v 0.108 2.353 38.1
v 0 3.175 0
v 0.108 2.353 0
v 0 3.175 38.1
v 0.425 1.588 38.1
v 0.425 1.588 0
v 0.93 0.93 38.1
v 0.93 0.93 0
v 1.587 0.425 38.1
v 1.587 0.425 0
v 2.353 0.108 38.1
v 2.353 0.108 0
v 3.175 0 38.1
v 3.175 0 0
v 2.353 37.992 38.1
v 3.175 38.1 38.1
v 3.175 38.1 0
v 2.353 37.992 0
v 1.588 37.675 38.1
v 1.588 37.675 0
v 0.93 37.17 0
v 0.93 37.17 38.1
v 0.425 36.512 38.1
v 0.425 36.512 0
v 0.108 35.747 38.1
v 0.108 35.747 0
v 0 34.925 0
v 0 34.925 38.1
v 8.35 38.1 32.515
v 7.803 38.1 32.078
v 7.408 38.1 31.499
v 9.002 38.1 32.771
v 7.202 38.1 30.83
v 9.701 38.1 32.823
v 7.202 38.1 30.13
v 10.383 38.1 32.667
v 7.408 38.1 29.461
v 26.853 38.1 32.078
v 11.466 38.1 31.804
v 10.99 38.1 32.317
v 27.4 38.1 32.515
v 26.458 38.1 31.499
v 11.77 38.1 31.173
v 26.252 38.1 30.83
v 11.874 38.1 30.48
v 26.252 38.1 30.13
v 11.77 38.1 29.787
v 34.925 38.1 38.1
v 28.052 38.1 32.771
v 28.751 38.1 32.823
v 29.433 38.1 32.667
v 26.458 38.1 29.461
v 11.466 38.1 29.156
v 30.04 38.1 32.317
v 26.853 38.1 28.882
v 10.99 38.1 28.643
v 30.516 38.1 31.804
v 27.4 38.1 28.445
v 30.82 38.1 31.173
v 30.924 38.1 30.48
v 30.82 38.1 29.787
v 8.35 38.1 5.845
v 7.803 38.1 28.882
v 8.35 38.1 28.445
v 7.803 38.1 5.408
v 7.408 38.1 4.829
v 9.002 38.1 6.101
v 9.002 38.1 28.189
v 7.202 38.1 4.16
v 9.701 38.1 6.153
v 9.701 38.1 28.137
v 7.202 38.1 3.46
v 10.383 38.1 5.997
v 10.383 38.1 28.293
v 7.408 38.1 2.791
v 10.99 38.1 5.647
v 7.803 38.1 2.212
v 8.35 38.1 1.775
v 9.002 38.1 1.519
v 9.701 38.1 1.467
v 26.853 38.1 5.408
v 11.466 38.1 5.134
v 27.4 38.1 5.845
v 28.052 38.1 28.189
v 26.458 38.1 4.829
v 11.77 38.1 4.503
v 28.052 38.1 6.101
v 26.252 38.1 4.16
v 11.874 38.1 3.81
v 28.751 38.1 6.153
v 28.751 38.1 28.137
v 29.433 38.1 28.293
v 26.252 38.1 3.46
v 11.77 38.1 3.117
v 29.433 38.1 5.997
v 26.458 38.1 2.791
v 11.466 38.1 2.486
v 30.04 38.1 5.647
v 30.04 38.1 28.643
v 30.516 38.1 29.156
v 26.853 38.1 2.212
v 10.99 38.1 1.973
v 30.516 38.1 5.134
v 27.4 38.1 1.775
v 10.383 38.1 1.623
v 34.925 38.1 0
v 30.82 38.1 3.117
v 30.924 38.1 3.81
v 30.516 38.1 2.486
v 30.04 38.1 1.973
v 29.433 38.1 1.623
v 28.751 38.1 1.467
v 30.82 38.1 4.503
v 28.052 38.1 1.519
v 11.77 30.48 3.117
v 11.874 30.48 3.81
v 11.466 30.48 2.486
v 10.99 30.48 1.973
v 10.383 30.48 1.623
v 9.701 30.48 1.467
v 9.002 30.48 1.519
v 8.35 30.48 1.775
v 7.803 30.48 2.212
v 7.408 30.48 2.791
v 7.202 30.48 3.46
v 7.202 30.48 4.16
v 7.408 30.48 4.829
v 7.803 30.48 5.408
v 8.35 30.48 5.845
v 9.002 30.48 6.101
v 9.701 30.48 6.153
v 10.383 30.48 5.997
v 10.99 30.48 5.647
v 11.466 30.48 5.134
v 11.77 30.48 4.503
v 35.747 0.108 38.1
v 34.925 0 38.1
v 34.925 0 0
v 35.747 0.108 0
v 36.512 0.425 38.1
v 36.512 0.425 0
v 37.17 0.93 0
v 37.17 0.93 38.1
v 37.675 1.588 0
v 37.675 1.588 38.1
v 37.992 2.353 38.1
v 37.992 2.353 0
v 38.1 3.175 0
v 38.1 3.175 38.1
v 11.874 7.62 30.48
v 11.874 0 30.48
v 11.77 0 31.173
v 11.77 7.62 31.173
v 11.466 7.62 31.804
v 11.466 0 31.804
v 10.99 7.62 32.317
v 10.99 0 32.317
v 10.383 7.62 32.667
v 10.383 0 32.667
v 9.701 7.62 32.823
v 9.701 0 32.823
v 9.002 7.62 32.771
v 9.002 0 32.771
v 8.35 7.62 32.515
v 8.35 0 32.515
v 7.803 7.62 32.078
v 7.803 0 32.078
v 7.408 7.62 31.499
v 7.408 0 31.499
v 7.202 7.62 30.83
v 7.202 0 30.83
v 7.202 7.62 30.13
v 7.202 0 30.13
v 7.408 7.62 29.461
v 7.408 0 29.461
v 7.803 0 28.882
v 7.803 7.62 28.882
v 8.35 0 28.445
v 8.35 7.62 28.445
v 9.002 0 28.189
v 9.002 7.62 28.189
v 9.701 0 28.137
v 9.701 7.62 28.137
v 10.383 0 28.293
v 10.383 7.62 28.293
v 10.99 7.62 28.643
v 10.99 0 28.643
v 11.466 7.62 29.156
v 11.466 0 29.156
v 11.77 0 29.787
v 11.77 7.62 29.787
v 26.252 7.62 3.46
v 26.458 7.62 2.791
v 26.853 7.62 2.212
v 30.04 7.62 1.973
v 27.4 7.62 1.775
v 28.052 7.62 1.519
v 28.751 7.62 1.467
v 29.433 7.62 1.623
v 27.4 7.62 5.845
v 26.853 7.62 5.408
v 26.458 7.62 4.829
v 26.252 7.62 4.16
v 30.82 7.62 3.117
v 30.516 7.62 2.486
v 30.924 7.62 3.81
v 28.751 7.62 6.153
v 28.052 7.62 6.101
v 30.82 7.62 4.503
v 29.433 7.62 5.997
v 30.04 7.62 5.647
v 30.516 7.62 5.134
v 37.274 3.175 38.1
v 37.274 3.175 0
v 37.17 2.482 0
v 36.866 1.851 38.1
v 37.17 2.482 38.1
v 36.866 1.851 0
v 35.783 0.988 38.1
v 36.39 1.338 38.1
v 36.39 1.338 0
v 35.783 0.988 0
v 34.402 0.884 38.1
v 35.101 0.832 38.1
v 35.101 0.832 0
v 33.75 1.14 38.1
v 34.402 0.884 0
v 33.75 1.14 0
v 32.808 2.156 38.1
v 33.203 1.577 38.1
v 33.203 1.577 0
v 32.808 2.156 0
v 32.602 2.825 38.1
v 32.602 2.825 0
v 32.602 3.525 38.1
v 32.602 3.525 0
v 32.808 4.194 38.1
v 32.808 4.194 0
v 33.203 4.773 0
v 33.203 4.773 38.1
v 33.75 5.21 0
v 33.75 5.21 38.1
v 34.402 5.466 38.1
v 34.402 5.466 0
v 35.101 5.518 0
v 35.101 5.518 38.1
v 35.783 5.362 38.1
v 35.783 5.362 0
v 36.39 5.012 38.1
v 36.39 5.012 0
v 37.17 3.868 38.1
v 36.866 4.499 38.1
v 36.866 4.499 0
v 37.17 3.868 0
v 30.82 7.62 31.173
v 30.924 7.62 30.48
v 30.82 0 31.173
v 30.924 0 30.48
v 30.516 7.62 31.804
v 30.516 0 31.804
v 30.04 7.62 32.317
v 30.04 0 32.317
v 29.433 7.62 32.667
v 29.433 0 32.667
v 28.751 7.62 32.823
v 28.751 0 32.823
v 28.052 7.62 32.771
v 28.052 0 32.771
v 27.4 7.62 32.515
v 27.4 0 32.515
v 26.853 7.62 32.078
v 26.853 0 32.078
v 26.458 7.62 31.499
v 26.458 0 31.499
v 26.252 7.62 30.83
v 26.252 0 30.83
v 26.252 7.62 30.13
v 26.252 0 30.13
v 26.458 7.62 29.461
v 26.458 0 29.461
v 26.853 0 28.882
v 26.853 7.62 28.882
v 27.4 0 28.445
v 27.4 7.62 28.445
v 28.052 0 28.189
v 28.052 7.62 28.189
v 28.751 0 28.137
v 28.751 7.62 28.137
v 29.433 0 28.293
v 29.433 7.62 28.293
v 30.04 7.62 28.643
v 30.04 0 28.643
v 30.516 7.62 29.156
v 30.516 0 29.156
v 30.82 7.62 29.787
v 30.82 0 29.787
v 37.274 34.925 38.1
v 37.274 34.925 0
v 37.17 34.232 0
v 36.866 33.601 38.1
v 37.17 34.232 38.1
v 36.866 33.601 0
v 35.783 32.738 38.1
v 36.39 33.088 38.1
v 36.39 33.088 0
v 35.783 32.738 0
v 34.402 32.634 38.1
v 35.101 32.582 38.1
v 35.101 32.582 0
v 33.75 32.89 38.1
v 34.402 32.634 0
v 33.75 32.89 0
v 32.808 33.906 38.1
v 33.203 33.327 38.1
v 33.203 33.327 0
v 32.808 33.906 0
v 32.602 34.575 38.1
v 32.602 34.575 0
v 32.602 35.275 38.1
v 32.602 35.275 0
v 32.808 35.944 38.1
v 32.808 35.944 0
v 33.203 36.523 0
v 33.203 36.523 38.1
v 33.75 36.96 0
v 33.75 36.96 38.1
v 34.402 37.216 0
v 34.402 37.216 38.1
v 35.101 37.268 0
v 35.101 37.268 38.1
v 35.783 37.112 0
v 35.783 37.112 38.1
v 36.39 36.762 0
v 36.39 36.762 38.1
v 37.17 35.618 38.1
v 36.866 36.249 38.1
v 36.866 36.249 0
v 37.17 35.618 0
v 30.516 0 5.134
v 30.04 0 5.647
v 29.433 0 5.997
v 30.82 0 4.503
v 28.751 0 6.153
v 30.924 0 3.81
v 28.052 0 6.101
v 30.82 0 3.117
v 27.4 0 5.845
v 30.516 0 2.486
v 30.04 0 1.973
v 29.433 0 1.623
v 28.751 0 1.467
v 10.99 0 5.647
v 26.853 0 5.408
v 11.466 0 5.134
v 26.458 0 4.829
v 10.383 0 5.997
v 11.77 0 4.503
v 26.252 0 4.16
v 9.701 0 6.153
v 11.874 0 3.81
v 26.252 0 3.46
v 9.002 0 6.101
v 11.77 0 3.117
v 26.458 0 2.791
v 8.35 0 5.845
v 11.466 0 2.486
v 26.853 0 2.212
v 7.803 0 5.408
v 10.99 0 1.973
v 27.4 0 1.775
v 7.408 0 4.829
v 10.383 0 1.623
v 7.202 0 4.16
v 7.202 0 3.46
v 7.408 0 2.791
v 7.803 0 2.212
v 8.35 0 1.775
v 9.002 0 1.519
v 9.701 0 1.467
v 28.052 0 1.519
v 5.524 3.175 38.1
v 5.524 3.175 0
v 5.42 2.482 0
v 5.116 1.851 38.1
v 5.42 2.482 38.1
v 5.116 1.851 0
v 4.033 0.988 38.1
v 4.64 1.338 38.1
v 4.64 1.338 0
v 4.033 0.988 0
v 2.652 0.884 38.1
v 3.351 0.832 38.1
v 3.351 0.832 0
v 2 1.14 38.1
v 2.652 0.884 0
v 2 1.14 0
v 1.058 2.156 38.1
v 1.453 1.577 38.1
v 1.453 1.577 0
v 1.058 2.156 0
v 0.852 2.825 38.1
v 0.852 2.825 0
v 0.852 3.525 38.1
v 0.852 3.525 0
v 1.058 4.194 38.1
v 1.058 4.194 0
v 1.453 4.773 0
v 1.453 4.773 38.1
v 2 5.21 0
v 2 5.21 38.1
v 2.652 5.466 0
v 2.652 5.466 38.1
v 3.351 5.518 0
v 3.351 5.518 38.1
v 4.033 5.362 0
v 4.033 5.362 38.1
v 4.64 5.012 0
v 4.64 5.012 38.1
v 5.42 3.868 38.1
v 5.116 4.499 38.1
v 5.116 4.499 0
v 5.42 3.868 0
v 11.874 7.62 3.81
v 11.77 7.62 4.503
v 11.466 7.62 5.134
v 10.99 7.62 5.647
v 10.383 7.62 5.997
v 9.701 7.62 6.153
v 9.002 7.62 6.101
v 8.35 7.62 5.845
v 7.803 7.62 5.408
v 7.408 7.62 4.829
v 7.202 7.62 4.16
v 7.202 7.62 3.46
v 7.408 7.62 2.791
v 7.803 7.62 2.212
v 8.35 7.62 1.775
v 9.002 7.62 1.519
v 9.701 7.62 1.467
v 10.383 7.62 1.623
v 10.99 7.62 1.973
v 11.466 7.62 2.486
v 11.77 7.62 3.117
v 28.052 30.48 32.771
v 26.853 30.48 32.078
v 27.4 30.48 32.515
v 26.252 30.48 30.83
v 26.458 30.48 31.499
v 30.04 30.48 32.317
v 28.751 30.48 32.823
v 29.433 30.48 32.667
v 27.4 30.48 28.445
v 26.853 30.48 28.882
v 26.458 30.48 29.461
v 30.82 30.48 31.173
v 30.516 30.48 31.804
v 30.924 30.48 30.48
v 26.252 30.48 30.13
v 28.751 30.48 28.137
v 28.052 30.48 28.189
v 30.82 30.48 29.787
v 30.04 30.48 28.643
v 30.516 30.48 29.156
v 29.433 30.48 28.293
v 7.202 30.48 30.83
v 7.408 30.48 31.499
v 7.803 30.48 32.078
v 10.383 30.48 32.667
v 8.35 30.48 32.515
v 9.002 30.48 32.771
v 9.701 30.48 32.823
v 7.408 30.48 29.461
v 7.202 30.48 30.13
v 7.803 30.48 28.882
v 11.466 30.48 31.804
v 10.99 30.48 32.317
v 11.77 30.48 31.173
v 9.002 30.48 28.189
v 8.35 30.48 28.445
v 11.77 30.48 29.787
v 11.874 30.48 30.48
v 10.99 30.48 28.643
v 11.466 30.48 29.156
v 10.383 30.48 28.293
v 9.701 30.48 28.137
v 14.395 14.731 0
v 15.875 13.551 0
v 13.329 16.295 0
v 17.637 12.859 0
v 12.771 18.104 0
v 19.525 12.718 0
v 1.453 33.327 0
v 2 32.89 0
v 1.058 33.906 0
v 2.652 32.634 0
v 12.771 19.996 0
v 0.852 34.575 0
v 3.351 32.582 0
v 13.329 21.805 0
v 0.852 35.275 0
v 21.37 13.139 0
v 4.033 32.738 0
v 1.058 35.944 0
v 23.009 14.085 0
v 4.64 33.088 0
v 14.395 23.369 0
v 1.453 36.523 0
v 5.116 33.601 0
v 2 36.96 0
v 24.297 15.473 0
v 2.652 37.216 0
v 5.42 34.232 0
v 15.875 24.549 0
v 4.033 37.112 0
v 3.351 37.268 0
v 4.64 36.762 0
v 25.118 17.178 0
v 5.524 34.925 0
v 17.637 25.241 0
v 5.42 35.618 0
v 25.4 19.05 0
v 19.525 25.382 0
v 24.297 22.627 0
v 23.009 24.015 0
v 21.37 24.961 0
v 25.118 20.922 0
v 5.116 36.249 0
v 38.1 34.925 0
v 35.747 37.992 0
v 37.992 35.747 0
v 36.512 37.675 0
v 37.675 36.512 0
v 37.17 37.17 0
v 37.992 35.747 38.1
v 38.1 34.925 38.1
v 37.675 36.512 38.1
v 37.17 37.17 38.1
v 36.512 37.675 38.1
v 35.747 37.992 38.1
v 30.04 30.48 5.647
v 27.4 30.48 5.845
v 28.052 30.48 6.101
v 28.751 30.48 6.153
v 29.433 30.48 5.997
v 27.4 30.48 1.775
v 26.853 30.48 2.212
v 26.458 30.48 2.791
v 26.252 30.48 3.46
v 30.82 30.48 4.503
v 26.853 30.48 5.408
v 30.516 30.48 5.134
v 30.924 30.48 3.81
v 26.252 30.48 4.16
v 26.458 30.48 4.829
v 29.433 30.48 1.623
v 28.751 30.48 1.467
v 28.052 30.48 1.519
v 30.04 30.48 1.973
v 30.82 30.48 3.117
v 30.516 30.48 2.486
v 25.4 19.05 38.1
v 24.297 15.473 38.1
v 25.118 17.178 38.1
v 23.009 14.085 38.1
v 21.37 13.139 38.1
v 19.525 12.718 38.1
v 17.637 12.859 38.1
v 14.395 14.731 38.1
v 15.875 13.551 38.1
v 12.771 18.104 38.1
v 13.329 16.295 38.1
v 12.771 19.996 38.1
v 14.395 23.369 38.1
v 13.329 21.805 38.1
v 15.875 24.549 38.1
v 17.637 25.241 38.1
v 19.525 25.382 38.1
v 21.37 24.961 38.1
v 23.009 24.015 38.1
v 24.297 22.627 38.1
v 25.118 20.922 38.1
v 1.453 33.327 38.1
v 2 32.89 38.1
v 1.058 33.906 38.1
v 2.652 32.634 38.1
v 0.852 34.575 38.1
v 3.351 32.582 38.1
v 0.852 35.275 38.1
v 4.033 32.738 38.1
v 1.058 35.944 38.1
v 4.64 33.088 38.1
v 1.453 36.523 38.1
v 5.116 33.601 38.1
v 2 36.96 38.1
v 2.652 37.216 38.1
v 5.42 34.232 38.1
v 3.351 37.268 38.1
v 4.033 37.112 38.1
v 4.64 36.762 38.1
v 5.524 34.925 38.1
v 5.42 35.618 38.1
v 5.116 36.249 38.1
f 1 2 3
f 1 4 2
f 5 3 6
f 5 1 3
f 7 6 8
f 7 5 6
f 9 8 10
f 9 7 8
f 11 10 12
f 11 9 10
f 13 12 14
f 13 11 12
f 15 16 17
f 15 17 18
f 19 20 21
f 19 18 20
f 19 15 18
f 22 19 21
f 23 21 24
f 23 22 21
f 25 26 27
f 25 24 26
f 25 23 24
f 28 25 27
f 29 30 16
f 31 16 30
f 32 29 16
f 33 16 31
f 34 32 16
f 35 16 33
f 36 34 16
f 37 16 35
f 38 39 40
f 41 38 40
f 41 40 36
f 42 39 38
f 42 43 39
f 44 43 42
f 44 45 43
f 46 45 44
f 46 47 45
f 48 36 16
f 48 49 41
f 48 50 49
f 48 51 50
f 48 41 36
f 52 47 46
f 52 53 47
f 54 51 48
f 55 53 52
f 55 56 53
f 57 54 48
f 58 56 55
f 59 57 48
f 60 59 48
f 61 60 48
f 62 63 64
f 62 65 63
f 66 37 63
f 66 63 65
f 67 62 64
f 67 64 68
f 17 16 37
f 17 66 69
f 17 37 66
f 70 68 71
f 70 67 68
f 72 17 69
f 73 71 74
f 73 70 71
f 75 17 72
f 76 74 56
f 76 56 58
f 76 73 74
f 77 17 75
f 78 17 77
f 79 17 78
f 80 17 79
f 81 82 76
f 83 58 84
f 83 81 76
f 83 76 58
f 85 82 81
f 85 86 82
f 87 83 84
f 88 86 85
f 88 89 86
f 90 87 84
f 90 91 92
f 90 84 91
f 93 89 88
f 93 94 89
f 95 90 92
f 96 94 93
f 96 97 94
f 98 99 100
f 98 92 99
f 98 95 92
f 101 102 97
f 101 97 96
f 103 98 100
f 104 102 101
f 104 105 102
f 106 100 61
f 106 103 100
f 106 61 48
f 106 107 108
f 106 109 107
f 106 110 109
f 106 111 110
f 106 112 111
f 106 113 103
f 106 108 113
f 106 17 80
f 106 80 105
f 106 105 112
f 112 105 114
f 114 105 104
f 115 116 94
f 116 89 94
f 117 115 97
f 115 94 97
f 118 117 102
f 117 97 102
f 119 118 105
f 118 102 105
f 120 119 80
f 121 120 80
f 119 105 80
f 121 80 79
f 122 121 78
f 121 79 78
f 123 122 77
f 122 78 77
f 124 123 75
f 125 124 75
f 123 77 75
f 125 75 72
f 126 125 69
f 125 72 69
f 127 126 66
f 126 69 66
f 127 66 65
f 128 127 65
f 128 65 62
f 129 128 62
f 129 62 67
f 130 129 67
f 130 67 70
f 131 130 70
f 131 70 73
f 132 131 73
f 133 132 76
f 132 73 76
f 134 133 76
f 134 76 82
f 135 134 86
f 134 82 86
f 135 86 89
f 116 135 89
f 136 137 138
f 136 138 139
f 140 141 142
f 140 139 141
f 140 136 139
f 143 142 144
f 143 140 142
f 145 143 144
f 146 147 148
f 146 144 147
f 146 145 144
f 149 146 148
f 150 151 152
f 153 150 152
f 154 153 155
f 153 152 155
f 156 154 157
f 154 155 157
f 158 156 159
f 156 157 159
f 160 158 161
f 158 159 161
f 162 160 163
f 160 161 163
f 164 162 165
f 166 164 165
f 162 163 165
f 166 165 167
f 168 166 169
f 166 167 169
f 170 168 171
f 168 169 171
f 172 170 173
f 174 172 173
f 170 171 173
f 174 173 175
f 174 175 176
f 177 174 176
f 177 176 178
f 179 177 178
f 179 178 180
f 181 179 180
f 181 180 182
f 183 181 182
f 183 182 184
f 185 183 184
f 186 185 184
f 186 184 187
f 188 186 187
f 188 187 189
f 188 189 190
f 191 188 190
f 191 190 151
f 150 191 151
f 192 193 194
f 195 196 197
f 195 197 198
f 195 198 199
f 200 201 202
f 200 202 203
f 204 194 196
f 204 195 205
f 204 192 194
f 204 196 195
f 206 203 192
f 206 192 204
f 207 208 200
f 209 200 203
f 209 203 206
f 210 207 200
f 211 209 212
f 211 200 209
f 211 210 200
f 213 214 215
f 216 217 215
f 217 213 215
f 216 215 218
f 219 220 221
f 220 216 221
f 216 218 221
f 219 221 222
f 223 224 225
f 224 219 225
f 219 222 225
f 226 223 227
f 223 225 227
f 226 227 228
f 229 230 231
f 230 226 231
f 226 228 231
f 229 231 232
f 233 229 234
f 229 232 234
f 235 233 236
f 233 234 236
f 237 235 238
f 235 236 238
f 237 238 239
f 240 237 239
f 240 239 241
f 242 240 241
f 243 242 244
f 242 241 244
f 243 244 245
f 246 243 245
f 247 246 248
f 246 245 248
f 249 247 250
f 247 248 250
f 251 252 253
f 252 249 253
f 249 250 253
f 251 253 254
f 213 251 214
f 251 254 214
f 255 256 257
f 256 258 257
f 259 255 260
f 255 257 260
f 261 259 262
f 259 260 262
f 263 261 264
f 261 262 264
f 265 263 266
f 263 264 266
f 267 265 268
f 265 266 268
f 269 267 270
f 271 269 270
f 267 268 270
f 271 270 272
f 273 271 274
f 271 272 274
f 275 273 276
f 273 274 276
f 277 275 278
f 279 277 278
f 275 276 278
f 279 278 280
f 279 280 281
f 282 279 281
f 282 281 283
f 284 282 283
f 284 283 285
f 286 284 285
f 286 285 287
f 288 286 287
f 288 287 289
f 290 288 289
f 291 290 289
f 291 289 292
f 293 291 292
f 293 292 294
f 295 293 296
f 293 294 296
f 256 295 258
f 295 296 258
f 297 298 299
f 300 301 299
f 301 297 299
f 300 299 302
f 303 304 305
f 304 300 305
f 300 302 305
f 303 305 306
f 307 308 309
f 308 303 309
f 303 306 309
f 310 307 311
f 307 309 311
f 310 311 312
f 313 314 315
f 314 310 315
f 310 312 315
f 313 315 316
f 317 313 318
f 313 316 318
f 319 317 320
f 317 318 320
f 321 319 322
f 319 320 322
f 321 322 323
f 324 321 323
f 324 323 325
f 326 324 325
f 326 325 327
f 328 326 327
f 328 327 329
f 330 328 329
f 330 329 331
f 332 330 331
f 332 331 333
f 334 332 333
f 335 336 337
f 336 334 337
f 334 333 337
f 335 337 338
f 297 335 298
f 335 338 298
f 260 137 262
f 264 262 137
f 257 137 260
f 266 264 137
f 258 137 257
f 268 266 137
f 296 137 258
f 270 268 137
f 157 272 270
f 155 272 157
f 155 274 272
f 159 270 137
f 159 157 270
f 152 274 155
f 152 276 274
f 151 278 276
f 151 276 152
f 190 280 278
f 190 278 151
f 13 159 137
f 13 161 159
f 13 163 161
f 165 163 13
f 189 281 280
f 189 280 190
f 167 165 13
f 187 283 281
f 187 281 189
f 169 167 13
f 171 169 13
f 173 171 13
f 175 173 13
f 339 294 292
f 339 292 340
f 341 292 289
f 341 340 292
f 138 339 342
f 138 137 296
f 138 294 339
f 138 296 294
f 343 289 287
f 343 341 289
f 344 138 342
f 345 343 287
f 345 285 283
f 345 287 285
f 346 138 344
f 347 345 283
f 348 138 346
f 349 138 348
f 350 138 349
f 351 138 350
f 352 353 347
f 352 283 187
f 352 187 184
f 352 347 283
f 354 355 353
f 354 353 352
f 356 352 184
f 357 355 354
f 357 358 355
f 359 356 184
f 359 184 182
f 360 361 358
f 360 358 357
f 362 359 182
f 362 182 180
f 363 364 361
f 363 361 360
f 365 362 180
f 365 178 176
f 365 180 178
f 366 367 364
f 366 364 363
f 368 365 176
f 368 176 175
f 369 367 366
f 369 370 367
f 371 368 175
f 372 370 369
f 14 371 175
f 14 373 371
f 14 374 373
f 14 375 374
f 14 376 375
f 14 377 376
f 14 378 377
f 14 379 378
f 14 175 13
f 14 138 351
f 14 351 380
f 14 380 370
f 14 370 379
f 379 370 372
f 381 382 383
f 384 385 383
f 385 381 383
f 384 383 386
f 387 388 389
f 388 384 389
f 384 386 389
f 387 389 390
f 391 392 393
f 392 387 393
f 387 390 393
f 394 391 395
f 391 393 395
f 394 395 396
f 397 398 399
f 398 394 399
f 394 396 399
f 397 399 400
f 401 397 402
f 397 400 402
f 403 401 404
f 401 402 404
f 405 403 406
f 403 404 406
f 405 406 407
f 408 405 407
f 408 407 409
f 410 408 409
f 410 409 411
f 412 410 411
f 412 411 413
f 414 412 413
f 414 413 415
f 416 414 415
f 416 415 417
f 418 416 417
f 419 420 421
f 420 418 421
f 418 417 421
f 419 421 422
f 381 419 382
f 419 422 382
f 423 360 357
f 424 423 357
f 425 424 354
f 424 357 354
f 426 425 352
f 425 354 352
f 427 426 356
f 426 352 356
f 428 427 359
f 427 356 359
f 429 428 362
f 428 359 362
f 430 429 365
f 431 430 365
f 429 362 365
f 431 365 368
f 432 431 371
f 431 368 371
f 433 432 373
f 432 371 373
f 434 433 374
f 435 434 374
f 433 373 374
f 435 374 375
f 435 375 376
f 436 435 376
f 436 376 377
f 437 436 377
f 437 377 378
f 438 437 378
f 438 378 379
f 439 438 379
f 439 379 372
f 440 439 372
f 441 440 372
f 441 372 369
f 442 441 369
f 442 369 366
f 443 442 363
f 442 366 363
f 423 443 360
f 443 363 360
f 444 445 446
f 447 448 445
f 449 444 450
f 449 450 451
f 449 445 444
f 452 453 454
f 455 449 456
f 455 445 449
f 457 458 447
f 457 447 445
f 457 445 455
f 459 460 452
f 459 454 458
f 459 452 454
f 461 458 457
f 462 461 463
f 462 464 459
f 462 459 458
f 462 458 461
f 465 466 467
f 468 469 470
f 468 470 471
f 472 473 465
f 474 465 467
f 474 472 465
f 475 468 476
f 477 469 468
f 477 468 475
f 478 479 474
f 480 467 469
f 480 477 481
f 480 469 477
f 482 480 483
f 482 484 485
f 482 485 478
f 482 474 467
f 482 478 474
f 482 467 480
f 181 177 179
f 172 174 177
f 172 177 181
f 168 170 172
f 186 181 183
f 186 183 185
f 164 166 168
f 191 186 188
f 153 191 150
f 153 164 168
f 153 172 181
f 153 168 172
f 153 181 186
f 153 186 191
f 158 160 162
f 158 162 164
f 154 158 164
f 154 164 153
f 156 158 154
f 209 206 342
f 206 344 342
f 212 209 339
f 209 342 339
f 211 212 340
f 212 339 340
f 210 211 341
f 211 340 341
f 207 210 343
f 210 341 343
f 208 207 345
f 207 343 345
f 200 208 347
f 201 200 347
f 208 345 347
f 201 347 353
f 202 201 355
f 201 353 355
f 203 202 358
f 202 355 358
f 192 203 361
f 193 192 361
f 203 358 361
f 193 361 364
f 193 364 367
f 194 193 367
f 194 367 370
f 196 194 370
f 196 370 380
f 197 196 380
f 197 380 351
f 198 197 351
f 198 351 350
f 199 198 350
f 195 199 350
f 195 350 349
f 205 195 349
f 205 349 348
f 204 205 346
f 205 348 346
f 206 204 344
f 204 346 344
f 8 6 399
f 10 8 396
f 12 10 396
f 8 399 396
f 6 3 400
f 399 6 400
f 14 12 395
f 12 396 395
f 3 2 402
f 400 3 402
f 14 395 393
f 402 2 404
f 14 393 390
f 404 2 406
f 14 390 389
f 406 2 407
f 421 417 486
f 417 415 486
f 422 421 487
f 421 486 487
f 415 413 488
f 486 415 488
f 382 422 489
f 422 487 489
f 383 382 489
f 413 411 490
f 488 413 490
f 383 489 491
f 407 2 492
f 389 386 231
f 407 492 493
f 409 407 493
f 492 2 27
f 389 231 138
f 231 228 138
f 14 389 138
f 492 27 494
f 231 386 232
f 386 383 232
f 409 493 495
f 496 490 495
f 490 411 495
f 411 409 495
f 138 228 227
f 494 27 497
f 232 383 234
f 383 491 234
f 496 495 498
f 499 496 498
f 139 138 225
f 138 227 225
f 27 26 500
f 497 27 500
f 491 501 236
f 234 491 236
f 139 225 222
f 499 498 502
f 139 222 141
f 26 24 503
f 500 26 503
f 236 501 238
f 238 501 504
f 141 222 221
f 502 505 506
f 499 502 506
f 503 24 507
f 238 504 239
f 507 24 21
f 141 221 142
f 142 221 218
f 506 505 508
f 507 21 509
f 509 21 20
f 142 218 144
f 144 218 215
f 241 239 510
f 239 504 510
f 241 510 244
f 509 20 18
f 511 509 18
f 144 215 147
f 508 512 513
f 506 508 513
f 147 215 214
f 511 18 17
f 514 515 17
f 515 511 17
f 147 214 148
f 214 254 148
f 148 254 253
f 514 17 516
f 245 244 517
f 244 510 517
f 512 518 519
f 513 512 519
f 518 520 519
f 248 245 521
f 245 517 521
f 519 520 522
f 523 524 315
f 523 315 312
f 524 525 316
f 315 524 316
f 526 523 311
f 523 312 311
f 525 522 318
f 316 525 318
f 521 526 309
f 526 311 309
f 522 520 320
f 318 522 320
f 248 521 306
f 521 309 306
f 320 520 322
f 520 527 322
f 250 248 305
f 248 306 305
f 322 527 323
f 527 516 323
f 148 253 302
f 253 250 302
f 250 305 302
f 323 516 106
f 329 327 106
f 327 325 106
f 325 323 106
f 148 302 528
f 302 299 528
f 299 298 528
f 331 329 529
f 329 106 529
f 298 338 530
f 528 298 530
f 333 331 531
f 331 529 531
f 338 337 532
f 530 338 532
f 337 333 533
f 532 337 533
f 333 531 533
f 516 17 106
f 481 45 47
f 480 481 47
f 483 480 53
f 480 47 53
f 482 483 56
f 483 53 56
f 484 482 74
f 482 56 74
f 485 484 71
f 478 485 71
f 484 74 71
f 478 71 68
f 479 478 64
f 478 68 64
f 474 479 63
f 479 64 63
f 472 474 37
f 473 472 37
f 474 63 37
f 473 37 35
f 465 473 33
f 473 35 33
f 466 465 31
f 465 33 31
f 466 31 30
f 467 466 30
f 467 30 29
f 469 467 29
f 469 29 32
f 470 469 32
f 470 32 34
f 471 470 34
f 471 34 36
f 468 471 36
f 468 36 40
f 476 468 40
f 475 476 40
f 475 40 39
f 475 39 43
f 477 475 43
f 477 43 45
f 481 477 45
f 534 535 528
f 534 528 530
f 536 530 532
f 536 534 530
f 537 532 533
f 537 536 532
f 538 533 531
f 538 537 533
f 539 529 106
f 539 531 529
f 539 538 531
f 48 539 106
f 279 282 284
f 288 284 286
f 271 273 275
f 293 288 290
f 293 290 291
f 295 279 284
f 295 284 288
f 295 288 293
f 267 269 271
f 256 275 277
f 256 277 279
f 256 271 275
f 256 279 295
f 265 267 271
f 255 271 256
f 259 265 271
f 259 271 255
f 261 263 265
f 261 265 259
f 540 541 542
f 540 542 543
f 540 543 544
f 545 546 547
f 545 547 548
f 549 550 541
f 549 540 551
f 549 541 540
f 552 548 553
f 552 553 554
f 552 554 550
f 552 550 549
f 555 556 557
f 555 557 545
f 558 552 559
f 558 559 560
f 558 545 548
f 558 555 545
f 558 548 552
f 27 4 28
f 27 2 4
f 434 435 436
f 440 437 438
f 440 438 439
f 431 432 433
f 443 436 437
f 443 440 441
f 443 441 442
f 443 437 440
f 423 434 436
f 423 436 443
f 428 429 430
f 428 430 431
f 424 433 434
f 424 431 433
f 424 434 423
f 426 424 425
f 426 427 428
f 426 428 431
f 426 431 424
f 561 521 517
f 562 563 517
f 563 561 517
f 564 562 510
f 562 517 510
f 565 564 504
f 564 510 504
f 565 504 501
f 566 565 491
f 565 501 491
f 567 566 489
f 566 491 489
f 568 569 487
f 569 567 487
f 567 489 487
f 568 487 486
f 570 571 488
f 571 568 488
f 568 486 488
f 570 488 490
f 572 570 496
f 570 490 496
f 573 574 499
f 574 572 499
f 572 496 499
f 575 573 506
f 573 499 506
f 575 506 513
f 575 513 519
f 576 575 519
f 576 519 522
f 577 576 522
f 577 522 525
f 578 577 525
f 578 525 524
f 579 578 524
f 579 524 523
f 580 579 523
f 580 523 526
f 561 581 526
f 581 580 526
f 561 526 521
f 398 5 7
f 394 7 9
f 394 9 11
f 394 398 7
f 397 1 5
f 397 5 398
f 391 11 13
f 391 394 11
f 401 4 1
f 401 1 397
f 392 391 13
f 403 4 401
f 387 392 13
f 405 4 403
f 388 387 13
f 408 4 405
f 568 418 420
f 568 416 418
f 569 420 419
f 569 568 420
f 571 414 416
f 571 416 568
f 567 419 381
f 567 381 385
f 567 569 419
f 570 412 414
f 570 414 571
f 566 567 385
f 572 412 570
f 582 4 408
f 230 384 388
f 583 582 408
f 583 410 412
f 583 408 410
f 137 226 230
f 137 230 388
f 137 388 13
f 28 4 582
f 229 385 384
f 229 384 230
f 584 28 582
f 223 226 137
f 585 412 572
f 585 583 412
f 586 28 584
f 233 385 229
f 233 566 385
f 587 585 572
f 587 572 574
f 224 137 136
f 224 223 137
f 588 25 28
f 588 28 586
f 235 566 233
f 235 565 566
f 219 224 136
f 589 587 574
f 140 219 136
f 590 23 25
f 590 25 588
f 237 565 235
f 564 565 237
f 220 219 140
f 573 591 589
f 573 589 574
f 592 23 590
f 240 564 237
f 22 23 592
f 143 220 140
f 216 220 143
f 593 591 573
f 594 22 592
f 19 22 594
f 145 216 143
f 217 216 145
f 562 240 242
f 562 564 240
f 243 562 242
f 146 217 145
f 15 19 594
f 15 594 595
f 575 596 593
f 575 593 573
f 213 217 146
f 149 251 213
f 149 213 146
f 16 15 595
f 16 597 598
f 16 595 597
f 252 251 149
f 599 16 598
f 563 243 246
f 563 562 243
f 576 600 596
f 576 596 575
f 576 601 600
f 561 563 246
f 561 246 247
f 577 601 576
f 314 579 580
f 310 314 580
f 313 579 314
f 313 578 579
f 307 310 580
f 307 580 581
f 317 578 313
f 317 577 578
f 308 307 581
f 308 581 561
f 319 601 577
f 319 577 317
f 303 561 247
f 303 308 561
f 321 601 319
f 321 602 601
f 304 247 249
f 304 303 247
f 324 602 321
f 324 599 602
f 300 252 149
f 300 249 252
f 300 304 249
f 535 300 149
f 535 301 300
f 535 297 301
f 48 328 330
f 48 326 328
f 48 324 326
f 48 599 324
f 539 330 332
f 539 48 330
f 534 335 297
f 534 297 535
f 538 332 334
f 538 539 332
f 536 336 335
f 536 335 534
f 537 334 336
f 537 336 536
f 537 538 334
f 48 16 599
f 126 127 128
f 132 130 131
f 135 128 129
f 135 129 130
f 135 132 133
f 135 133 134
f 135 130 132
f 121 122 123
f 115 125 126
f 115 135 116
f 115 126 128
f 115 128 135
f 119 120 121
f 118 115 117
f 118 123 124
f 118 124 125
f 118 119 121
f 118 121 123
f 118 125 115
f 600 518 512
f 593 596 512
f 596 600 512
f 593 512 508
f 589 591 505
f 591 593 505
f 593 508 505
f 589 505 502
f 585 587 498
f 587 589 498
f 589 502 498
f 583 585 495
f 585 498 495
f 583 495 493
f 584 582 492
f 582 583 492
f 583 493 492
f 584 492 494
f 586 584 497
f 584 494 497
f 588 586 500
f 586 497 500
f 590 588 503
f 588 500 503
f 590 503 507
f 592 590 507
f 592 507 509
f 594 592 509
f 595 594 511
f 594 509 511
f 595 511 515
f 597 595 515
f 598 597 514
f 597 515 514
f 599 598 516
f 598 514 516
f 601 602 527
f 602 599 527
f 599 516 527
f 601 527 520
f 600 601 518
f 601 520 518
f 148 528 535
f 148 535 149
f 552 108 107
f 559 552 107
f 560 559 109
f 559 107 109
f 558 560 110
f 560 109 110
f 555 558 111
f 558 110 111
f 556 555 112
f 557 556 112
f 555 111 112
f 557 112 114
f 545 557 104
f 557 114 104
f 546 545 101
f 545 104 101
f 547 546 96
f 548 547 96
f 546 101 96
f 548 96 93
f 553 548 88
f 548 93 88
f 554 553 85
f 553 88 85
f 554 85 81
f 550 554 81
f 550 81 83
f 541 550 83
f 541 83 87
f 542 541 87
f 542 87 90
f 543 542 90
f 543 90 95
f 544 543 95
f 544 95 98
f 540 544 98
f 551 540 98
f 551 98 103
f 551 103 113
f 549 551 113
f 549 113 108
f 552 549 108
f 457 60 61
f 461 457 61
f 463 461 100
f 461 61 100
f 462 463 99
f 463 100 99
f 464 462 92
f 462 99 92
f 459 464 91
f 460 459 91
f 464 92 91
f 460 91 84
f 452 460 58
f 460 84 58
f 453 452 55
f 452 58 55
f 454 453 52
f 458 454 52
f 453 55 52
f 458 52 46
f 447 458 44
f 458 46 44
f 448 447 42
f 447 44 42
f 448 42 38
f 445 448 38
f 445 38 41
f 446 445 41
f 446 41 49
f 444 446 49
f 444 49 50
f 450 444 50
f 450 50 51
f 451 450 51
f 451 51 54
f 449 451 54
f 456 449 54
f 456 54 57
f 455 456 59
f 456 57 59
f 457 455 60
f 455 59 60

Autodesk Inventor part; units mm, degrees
ref_plane "YZ Plane" through (0, 0, 0) normal (1, 0, 0) x (0, 1, 0)
ref_plane "XZ Plane" through (0, 0, 0) normal (0, 1, 0) x (-1, 0, 0)
ref_plane "XY Plane" through (0, 0, 0) normal (0, 0, 1) x (1, 0, 0)
sketch "Sketch1" plane through (0, 0, 0) normal (0, 0, 1) x (1, 0, 0)
  line L0 (0, 0) -> (0, 38.1)
  line L1 (0, 38.1) -> (38.1, 38.1)
  line L2 (38.1, 38.1) -> (38.1, 0)
  line L3 (38.1, 0) -> (0, 0)
  circle A0 centre (19.05, 19.05) radius 6.35
  circle A1 centre (3.175, 34.925) radius 2.3495
  circle A2 centre (34.925, 34.925) radius 2.3495
  circle A3 centre (3.175, 3.175) radius 2.3495
  circle A4 centre (34.925, 3.175) radius 2.3495
  dimension "d0" = 38.1
  dimension "d1" = 38.1
  dimension "d2" = 12.7
  dimension "d3" = 19.05
  dimension "d4" = 19.05
  dimension "d34" = 4.699
  dimension "d37" = 31.75
  dimension "d40" = 31.75
  dimension "d43" = 3.175
  dimension "d44" = 3.175
extrude "Extrusion1" add sketch "Sketch1" along normal blind 38.1
fillet "Fillet1" radius 3.175 4 edges at (38.1, 38.1, 19.05) (38.1, 0, 19.05) (0, 38.1, 19.05) (0, 0, 19.05)
sketch "Sketch2" plane through (0, 38.1, 0) normal (0, 1, 0) x (1, 0, 0)
  line L0 (0, 0) -> (38.1, 0) projected
  line L1 (0, 0) -> (0, -38.1) projected
  circle A0 centre (9.525, -3.81) radius 2.3495
  circle A1 centre (28.575, -3.81) radius 2.3495
  circle A2 centre (9.525, -30.48) radius 2.3495
  circle A3 centre (28.575, -30.48) radius 2.3495
  dimension "d8" = 4.699
  dimension "d11" = 19.05
  dimension "d14" = 26.67
  dimension "d17" = 3.81
  dimension "d18" = 9.525
extrude "Extrusion2" cut sketch "Sketch2" against normal blind 7.62
sketch "Sketch3" plane through (0, 0, 0) normal (0, -1, 0) x (1, 0, 0)
  line L0 (38.1, 0) -> (0, 0) projected
  line L1 (38.1, 0) -> (38.1, 38.1) projected
  circle A0 centre (28.575, 3.81) radius 2.3495
  circle A1 centre (9.525, 3.81) radius 2.3495
  circle A2 centre (28.575, 30.48) radius 2.3495
  circle A3 centre (9.525, 30.48) radius 2.3495
  dimension "d21" = 4.699
  dimension "d24" = 19.05
  dimension "d27" = 26.67
  dimension "d30" = 3.81
  dimension "d31" = 9.525
extrude "Extrusion3" cut sketch "Sketch3" against normal blind 7.62
properties part number "Base"
